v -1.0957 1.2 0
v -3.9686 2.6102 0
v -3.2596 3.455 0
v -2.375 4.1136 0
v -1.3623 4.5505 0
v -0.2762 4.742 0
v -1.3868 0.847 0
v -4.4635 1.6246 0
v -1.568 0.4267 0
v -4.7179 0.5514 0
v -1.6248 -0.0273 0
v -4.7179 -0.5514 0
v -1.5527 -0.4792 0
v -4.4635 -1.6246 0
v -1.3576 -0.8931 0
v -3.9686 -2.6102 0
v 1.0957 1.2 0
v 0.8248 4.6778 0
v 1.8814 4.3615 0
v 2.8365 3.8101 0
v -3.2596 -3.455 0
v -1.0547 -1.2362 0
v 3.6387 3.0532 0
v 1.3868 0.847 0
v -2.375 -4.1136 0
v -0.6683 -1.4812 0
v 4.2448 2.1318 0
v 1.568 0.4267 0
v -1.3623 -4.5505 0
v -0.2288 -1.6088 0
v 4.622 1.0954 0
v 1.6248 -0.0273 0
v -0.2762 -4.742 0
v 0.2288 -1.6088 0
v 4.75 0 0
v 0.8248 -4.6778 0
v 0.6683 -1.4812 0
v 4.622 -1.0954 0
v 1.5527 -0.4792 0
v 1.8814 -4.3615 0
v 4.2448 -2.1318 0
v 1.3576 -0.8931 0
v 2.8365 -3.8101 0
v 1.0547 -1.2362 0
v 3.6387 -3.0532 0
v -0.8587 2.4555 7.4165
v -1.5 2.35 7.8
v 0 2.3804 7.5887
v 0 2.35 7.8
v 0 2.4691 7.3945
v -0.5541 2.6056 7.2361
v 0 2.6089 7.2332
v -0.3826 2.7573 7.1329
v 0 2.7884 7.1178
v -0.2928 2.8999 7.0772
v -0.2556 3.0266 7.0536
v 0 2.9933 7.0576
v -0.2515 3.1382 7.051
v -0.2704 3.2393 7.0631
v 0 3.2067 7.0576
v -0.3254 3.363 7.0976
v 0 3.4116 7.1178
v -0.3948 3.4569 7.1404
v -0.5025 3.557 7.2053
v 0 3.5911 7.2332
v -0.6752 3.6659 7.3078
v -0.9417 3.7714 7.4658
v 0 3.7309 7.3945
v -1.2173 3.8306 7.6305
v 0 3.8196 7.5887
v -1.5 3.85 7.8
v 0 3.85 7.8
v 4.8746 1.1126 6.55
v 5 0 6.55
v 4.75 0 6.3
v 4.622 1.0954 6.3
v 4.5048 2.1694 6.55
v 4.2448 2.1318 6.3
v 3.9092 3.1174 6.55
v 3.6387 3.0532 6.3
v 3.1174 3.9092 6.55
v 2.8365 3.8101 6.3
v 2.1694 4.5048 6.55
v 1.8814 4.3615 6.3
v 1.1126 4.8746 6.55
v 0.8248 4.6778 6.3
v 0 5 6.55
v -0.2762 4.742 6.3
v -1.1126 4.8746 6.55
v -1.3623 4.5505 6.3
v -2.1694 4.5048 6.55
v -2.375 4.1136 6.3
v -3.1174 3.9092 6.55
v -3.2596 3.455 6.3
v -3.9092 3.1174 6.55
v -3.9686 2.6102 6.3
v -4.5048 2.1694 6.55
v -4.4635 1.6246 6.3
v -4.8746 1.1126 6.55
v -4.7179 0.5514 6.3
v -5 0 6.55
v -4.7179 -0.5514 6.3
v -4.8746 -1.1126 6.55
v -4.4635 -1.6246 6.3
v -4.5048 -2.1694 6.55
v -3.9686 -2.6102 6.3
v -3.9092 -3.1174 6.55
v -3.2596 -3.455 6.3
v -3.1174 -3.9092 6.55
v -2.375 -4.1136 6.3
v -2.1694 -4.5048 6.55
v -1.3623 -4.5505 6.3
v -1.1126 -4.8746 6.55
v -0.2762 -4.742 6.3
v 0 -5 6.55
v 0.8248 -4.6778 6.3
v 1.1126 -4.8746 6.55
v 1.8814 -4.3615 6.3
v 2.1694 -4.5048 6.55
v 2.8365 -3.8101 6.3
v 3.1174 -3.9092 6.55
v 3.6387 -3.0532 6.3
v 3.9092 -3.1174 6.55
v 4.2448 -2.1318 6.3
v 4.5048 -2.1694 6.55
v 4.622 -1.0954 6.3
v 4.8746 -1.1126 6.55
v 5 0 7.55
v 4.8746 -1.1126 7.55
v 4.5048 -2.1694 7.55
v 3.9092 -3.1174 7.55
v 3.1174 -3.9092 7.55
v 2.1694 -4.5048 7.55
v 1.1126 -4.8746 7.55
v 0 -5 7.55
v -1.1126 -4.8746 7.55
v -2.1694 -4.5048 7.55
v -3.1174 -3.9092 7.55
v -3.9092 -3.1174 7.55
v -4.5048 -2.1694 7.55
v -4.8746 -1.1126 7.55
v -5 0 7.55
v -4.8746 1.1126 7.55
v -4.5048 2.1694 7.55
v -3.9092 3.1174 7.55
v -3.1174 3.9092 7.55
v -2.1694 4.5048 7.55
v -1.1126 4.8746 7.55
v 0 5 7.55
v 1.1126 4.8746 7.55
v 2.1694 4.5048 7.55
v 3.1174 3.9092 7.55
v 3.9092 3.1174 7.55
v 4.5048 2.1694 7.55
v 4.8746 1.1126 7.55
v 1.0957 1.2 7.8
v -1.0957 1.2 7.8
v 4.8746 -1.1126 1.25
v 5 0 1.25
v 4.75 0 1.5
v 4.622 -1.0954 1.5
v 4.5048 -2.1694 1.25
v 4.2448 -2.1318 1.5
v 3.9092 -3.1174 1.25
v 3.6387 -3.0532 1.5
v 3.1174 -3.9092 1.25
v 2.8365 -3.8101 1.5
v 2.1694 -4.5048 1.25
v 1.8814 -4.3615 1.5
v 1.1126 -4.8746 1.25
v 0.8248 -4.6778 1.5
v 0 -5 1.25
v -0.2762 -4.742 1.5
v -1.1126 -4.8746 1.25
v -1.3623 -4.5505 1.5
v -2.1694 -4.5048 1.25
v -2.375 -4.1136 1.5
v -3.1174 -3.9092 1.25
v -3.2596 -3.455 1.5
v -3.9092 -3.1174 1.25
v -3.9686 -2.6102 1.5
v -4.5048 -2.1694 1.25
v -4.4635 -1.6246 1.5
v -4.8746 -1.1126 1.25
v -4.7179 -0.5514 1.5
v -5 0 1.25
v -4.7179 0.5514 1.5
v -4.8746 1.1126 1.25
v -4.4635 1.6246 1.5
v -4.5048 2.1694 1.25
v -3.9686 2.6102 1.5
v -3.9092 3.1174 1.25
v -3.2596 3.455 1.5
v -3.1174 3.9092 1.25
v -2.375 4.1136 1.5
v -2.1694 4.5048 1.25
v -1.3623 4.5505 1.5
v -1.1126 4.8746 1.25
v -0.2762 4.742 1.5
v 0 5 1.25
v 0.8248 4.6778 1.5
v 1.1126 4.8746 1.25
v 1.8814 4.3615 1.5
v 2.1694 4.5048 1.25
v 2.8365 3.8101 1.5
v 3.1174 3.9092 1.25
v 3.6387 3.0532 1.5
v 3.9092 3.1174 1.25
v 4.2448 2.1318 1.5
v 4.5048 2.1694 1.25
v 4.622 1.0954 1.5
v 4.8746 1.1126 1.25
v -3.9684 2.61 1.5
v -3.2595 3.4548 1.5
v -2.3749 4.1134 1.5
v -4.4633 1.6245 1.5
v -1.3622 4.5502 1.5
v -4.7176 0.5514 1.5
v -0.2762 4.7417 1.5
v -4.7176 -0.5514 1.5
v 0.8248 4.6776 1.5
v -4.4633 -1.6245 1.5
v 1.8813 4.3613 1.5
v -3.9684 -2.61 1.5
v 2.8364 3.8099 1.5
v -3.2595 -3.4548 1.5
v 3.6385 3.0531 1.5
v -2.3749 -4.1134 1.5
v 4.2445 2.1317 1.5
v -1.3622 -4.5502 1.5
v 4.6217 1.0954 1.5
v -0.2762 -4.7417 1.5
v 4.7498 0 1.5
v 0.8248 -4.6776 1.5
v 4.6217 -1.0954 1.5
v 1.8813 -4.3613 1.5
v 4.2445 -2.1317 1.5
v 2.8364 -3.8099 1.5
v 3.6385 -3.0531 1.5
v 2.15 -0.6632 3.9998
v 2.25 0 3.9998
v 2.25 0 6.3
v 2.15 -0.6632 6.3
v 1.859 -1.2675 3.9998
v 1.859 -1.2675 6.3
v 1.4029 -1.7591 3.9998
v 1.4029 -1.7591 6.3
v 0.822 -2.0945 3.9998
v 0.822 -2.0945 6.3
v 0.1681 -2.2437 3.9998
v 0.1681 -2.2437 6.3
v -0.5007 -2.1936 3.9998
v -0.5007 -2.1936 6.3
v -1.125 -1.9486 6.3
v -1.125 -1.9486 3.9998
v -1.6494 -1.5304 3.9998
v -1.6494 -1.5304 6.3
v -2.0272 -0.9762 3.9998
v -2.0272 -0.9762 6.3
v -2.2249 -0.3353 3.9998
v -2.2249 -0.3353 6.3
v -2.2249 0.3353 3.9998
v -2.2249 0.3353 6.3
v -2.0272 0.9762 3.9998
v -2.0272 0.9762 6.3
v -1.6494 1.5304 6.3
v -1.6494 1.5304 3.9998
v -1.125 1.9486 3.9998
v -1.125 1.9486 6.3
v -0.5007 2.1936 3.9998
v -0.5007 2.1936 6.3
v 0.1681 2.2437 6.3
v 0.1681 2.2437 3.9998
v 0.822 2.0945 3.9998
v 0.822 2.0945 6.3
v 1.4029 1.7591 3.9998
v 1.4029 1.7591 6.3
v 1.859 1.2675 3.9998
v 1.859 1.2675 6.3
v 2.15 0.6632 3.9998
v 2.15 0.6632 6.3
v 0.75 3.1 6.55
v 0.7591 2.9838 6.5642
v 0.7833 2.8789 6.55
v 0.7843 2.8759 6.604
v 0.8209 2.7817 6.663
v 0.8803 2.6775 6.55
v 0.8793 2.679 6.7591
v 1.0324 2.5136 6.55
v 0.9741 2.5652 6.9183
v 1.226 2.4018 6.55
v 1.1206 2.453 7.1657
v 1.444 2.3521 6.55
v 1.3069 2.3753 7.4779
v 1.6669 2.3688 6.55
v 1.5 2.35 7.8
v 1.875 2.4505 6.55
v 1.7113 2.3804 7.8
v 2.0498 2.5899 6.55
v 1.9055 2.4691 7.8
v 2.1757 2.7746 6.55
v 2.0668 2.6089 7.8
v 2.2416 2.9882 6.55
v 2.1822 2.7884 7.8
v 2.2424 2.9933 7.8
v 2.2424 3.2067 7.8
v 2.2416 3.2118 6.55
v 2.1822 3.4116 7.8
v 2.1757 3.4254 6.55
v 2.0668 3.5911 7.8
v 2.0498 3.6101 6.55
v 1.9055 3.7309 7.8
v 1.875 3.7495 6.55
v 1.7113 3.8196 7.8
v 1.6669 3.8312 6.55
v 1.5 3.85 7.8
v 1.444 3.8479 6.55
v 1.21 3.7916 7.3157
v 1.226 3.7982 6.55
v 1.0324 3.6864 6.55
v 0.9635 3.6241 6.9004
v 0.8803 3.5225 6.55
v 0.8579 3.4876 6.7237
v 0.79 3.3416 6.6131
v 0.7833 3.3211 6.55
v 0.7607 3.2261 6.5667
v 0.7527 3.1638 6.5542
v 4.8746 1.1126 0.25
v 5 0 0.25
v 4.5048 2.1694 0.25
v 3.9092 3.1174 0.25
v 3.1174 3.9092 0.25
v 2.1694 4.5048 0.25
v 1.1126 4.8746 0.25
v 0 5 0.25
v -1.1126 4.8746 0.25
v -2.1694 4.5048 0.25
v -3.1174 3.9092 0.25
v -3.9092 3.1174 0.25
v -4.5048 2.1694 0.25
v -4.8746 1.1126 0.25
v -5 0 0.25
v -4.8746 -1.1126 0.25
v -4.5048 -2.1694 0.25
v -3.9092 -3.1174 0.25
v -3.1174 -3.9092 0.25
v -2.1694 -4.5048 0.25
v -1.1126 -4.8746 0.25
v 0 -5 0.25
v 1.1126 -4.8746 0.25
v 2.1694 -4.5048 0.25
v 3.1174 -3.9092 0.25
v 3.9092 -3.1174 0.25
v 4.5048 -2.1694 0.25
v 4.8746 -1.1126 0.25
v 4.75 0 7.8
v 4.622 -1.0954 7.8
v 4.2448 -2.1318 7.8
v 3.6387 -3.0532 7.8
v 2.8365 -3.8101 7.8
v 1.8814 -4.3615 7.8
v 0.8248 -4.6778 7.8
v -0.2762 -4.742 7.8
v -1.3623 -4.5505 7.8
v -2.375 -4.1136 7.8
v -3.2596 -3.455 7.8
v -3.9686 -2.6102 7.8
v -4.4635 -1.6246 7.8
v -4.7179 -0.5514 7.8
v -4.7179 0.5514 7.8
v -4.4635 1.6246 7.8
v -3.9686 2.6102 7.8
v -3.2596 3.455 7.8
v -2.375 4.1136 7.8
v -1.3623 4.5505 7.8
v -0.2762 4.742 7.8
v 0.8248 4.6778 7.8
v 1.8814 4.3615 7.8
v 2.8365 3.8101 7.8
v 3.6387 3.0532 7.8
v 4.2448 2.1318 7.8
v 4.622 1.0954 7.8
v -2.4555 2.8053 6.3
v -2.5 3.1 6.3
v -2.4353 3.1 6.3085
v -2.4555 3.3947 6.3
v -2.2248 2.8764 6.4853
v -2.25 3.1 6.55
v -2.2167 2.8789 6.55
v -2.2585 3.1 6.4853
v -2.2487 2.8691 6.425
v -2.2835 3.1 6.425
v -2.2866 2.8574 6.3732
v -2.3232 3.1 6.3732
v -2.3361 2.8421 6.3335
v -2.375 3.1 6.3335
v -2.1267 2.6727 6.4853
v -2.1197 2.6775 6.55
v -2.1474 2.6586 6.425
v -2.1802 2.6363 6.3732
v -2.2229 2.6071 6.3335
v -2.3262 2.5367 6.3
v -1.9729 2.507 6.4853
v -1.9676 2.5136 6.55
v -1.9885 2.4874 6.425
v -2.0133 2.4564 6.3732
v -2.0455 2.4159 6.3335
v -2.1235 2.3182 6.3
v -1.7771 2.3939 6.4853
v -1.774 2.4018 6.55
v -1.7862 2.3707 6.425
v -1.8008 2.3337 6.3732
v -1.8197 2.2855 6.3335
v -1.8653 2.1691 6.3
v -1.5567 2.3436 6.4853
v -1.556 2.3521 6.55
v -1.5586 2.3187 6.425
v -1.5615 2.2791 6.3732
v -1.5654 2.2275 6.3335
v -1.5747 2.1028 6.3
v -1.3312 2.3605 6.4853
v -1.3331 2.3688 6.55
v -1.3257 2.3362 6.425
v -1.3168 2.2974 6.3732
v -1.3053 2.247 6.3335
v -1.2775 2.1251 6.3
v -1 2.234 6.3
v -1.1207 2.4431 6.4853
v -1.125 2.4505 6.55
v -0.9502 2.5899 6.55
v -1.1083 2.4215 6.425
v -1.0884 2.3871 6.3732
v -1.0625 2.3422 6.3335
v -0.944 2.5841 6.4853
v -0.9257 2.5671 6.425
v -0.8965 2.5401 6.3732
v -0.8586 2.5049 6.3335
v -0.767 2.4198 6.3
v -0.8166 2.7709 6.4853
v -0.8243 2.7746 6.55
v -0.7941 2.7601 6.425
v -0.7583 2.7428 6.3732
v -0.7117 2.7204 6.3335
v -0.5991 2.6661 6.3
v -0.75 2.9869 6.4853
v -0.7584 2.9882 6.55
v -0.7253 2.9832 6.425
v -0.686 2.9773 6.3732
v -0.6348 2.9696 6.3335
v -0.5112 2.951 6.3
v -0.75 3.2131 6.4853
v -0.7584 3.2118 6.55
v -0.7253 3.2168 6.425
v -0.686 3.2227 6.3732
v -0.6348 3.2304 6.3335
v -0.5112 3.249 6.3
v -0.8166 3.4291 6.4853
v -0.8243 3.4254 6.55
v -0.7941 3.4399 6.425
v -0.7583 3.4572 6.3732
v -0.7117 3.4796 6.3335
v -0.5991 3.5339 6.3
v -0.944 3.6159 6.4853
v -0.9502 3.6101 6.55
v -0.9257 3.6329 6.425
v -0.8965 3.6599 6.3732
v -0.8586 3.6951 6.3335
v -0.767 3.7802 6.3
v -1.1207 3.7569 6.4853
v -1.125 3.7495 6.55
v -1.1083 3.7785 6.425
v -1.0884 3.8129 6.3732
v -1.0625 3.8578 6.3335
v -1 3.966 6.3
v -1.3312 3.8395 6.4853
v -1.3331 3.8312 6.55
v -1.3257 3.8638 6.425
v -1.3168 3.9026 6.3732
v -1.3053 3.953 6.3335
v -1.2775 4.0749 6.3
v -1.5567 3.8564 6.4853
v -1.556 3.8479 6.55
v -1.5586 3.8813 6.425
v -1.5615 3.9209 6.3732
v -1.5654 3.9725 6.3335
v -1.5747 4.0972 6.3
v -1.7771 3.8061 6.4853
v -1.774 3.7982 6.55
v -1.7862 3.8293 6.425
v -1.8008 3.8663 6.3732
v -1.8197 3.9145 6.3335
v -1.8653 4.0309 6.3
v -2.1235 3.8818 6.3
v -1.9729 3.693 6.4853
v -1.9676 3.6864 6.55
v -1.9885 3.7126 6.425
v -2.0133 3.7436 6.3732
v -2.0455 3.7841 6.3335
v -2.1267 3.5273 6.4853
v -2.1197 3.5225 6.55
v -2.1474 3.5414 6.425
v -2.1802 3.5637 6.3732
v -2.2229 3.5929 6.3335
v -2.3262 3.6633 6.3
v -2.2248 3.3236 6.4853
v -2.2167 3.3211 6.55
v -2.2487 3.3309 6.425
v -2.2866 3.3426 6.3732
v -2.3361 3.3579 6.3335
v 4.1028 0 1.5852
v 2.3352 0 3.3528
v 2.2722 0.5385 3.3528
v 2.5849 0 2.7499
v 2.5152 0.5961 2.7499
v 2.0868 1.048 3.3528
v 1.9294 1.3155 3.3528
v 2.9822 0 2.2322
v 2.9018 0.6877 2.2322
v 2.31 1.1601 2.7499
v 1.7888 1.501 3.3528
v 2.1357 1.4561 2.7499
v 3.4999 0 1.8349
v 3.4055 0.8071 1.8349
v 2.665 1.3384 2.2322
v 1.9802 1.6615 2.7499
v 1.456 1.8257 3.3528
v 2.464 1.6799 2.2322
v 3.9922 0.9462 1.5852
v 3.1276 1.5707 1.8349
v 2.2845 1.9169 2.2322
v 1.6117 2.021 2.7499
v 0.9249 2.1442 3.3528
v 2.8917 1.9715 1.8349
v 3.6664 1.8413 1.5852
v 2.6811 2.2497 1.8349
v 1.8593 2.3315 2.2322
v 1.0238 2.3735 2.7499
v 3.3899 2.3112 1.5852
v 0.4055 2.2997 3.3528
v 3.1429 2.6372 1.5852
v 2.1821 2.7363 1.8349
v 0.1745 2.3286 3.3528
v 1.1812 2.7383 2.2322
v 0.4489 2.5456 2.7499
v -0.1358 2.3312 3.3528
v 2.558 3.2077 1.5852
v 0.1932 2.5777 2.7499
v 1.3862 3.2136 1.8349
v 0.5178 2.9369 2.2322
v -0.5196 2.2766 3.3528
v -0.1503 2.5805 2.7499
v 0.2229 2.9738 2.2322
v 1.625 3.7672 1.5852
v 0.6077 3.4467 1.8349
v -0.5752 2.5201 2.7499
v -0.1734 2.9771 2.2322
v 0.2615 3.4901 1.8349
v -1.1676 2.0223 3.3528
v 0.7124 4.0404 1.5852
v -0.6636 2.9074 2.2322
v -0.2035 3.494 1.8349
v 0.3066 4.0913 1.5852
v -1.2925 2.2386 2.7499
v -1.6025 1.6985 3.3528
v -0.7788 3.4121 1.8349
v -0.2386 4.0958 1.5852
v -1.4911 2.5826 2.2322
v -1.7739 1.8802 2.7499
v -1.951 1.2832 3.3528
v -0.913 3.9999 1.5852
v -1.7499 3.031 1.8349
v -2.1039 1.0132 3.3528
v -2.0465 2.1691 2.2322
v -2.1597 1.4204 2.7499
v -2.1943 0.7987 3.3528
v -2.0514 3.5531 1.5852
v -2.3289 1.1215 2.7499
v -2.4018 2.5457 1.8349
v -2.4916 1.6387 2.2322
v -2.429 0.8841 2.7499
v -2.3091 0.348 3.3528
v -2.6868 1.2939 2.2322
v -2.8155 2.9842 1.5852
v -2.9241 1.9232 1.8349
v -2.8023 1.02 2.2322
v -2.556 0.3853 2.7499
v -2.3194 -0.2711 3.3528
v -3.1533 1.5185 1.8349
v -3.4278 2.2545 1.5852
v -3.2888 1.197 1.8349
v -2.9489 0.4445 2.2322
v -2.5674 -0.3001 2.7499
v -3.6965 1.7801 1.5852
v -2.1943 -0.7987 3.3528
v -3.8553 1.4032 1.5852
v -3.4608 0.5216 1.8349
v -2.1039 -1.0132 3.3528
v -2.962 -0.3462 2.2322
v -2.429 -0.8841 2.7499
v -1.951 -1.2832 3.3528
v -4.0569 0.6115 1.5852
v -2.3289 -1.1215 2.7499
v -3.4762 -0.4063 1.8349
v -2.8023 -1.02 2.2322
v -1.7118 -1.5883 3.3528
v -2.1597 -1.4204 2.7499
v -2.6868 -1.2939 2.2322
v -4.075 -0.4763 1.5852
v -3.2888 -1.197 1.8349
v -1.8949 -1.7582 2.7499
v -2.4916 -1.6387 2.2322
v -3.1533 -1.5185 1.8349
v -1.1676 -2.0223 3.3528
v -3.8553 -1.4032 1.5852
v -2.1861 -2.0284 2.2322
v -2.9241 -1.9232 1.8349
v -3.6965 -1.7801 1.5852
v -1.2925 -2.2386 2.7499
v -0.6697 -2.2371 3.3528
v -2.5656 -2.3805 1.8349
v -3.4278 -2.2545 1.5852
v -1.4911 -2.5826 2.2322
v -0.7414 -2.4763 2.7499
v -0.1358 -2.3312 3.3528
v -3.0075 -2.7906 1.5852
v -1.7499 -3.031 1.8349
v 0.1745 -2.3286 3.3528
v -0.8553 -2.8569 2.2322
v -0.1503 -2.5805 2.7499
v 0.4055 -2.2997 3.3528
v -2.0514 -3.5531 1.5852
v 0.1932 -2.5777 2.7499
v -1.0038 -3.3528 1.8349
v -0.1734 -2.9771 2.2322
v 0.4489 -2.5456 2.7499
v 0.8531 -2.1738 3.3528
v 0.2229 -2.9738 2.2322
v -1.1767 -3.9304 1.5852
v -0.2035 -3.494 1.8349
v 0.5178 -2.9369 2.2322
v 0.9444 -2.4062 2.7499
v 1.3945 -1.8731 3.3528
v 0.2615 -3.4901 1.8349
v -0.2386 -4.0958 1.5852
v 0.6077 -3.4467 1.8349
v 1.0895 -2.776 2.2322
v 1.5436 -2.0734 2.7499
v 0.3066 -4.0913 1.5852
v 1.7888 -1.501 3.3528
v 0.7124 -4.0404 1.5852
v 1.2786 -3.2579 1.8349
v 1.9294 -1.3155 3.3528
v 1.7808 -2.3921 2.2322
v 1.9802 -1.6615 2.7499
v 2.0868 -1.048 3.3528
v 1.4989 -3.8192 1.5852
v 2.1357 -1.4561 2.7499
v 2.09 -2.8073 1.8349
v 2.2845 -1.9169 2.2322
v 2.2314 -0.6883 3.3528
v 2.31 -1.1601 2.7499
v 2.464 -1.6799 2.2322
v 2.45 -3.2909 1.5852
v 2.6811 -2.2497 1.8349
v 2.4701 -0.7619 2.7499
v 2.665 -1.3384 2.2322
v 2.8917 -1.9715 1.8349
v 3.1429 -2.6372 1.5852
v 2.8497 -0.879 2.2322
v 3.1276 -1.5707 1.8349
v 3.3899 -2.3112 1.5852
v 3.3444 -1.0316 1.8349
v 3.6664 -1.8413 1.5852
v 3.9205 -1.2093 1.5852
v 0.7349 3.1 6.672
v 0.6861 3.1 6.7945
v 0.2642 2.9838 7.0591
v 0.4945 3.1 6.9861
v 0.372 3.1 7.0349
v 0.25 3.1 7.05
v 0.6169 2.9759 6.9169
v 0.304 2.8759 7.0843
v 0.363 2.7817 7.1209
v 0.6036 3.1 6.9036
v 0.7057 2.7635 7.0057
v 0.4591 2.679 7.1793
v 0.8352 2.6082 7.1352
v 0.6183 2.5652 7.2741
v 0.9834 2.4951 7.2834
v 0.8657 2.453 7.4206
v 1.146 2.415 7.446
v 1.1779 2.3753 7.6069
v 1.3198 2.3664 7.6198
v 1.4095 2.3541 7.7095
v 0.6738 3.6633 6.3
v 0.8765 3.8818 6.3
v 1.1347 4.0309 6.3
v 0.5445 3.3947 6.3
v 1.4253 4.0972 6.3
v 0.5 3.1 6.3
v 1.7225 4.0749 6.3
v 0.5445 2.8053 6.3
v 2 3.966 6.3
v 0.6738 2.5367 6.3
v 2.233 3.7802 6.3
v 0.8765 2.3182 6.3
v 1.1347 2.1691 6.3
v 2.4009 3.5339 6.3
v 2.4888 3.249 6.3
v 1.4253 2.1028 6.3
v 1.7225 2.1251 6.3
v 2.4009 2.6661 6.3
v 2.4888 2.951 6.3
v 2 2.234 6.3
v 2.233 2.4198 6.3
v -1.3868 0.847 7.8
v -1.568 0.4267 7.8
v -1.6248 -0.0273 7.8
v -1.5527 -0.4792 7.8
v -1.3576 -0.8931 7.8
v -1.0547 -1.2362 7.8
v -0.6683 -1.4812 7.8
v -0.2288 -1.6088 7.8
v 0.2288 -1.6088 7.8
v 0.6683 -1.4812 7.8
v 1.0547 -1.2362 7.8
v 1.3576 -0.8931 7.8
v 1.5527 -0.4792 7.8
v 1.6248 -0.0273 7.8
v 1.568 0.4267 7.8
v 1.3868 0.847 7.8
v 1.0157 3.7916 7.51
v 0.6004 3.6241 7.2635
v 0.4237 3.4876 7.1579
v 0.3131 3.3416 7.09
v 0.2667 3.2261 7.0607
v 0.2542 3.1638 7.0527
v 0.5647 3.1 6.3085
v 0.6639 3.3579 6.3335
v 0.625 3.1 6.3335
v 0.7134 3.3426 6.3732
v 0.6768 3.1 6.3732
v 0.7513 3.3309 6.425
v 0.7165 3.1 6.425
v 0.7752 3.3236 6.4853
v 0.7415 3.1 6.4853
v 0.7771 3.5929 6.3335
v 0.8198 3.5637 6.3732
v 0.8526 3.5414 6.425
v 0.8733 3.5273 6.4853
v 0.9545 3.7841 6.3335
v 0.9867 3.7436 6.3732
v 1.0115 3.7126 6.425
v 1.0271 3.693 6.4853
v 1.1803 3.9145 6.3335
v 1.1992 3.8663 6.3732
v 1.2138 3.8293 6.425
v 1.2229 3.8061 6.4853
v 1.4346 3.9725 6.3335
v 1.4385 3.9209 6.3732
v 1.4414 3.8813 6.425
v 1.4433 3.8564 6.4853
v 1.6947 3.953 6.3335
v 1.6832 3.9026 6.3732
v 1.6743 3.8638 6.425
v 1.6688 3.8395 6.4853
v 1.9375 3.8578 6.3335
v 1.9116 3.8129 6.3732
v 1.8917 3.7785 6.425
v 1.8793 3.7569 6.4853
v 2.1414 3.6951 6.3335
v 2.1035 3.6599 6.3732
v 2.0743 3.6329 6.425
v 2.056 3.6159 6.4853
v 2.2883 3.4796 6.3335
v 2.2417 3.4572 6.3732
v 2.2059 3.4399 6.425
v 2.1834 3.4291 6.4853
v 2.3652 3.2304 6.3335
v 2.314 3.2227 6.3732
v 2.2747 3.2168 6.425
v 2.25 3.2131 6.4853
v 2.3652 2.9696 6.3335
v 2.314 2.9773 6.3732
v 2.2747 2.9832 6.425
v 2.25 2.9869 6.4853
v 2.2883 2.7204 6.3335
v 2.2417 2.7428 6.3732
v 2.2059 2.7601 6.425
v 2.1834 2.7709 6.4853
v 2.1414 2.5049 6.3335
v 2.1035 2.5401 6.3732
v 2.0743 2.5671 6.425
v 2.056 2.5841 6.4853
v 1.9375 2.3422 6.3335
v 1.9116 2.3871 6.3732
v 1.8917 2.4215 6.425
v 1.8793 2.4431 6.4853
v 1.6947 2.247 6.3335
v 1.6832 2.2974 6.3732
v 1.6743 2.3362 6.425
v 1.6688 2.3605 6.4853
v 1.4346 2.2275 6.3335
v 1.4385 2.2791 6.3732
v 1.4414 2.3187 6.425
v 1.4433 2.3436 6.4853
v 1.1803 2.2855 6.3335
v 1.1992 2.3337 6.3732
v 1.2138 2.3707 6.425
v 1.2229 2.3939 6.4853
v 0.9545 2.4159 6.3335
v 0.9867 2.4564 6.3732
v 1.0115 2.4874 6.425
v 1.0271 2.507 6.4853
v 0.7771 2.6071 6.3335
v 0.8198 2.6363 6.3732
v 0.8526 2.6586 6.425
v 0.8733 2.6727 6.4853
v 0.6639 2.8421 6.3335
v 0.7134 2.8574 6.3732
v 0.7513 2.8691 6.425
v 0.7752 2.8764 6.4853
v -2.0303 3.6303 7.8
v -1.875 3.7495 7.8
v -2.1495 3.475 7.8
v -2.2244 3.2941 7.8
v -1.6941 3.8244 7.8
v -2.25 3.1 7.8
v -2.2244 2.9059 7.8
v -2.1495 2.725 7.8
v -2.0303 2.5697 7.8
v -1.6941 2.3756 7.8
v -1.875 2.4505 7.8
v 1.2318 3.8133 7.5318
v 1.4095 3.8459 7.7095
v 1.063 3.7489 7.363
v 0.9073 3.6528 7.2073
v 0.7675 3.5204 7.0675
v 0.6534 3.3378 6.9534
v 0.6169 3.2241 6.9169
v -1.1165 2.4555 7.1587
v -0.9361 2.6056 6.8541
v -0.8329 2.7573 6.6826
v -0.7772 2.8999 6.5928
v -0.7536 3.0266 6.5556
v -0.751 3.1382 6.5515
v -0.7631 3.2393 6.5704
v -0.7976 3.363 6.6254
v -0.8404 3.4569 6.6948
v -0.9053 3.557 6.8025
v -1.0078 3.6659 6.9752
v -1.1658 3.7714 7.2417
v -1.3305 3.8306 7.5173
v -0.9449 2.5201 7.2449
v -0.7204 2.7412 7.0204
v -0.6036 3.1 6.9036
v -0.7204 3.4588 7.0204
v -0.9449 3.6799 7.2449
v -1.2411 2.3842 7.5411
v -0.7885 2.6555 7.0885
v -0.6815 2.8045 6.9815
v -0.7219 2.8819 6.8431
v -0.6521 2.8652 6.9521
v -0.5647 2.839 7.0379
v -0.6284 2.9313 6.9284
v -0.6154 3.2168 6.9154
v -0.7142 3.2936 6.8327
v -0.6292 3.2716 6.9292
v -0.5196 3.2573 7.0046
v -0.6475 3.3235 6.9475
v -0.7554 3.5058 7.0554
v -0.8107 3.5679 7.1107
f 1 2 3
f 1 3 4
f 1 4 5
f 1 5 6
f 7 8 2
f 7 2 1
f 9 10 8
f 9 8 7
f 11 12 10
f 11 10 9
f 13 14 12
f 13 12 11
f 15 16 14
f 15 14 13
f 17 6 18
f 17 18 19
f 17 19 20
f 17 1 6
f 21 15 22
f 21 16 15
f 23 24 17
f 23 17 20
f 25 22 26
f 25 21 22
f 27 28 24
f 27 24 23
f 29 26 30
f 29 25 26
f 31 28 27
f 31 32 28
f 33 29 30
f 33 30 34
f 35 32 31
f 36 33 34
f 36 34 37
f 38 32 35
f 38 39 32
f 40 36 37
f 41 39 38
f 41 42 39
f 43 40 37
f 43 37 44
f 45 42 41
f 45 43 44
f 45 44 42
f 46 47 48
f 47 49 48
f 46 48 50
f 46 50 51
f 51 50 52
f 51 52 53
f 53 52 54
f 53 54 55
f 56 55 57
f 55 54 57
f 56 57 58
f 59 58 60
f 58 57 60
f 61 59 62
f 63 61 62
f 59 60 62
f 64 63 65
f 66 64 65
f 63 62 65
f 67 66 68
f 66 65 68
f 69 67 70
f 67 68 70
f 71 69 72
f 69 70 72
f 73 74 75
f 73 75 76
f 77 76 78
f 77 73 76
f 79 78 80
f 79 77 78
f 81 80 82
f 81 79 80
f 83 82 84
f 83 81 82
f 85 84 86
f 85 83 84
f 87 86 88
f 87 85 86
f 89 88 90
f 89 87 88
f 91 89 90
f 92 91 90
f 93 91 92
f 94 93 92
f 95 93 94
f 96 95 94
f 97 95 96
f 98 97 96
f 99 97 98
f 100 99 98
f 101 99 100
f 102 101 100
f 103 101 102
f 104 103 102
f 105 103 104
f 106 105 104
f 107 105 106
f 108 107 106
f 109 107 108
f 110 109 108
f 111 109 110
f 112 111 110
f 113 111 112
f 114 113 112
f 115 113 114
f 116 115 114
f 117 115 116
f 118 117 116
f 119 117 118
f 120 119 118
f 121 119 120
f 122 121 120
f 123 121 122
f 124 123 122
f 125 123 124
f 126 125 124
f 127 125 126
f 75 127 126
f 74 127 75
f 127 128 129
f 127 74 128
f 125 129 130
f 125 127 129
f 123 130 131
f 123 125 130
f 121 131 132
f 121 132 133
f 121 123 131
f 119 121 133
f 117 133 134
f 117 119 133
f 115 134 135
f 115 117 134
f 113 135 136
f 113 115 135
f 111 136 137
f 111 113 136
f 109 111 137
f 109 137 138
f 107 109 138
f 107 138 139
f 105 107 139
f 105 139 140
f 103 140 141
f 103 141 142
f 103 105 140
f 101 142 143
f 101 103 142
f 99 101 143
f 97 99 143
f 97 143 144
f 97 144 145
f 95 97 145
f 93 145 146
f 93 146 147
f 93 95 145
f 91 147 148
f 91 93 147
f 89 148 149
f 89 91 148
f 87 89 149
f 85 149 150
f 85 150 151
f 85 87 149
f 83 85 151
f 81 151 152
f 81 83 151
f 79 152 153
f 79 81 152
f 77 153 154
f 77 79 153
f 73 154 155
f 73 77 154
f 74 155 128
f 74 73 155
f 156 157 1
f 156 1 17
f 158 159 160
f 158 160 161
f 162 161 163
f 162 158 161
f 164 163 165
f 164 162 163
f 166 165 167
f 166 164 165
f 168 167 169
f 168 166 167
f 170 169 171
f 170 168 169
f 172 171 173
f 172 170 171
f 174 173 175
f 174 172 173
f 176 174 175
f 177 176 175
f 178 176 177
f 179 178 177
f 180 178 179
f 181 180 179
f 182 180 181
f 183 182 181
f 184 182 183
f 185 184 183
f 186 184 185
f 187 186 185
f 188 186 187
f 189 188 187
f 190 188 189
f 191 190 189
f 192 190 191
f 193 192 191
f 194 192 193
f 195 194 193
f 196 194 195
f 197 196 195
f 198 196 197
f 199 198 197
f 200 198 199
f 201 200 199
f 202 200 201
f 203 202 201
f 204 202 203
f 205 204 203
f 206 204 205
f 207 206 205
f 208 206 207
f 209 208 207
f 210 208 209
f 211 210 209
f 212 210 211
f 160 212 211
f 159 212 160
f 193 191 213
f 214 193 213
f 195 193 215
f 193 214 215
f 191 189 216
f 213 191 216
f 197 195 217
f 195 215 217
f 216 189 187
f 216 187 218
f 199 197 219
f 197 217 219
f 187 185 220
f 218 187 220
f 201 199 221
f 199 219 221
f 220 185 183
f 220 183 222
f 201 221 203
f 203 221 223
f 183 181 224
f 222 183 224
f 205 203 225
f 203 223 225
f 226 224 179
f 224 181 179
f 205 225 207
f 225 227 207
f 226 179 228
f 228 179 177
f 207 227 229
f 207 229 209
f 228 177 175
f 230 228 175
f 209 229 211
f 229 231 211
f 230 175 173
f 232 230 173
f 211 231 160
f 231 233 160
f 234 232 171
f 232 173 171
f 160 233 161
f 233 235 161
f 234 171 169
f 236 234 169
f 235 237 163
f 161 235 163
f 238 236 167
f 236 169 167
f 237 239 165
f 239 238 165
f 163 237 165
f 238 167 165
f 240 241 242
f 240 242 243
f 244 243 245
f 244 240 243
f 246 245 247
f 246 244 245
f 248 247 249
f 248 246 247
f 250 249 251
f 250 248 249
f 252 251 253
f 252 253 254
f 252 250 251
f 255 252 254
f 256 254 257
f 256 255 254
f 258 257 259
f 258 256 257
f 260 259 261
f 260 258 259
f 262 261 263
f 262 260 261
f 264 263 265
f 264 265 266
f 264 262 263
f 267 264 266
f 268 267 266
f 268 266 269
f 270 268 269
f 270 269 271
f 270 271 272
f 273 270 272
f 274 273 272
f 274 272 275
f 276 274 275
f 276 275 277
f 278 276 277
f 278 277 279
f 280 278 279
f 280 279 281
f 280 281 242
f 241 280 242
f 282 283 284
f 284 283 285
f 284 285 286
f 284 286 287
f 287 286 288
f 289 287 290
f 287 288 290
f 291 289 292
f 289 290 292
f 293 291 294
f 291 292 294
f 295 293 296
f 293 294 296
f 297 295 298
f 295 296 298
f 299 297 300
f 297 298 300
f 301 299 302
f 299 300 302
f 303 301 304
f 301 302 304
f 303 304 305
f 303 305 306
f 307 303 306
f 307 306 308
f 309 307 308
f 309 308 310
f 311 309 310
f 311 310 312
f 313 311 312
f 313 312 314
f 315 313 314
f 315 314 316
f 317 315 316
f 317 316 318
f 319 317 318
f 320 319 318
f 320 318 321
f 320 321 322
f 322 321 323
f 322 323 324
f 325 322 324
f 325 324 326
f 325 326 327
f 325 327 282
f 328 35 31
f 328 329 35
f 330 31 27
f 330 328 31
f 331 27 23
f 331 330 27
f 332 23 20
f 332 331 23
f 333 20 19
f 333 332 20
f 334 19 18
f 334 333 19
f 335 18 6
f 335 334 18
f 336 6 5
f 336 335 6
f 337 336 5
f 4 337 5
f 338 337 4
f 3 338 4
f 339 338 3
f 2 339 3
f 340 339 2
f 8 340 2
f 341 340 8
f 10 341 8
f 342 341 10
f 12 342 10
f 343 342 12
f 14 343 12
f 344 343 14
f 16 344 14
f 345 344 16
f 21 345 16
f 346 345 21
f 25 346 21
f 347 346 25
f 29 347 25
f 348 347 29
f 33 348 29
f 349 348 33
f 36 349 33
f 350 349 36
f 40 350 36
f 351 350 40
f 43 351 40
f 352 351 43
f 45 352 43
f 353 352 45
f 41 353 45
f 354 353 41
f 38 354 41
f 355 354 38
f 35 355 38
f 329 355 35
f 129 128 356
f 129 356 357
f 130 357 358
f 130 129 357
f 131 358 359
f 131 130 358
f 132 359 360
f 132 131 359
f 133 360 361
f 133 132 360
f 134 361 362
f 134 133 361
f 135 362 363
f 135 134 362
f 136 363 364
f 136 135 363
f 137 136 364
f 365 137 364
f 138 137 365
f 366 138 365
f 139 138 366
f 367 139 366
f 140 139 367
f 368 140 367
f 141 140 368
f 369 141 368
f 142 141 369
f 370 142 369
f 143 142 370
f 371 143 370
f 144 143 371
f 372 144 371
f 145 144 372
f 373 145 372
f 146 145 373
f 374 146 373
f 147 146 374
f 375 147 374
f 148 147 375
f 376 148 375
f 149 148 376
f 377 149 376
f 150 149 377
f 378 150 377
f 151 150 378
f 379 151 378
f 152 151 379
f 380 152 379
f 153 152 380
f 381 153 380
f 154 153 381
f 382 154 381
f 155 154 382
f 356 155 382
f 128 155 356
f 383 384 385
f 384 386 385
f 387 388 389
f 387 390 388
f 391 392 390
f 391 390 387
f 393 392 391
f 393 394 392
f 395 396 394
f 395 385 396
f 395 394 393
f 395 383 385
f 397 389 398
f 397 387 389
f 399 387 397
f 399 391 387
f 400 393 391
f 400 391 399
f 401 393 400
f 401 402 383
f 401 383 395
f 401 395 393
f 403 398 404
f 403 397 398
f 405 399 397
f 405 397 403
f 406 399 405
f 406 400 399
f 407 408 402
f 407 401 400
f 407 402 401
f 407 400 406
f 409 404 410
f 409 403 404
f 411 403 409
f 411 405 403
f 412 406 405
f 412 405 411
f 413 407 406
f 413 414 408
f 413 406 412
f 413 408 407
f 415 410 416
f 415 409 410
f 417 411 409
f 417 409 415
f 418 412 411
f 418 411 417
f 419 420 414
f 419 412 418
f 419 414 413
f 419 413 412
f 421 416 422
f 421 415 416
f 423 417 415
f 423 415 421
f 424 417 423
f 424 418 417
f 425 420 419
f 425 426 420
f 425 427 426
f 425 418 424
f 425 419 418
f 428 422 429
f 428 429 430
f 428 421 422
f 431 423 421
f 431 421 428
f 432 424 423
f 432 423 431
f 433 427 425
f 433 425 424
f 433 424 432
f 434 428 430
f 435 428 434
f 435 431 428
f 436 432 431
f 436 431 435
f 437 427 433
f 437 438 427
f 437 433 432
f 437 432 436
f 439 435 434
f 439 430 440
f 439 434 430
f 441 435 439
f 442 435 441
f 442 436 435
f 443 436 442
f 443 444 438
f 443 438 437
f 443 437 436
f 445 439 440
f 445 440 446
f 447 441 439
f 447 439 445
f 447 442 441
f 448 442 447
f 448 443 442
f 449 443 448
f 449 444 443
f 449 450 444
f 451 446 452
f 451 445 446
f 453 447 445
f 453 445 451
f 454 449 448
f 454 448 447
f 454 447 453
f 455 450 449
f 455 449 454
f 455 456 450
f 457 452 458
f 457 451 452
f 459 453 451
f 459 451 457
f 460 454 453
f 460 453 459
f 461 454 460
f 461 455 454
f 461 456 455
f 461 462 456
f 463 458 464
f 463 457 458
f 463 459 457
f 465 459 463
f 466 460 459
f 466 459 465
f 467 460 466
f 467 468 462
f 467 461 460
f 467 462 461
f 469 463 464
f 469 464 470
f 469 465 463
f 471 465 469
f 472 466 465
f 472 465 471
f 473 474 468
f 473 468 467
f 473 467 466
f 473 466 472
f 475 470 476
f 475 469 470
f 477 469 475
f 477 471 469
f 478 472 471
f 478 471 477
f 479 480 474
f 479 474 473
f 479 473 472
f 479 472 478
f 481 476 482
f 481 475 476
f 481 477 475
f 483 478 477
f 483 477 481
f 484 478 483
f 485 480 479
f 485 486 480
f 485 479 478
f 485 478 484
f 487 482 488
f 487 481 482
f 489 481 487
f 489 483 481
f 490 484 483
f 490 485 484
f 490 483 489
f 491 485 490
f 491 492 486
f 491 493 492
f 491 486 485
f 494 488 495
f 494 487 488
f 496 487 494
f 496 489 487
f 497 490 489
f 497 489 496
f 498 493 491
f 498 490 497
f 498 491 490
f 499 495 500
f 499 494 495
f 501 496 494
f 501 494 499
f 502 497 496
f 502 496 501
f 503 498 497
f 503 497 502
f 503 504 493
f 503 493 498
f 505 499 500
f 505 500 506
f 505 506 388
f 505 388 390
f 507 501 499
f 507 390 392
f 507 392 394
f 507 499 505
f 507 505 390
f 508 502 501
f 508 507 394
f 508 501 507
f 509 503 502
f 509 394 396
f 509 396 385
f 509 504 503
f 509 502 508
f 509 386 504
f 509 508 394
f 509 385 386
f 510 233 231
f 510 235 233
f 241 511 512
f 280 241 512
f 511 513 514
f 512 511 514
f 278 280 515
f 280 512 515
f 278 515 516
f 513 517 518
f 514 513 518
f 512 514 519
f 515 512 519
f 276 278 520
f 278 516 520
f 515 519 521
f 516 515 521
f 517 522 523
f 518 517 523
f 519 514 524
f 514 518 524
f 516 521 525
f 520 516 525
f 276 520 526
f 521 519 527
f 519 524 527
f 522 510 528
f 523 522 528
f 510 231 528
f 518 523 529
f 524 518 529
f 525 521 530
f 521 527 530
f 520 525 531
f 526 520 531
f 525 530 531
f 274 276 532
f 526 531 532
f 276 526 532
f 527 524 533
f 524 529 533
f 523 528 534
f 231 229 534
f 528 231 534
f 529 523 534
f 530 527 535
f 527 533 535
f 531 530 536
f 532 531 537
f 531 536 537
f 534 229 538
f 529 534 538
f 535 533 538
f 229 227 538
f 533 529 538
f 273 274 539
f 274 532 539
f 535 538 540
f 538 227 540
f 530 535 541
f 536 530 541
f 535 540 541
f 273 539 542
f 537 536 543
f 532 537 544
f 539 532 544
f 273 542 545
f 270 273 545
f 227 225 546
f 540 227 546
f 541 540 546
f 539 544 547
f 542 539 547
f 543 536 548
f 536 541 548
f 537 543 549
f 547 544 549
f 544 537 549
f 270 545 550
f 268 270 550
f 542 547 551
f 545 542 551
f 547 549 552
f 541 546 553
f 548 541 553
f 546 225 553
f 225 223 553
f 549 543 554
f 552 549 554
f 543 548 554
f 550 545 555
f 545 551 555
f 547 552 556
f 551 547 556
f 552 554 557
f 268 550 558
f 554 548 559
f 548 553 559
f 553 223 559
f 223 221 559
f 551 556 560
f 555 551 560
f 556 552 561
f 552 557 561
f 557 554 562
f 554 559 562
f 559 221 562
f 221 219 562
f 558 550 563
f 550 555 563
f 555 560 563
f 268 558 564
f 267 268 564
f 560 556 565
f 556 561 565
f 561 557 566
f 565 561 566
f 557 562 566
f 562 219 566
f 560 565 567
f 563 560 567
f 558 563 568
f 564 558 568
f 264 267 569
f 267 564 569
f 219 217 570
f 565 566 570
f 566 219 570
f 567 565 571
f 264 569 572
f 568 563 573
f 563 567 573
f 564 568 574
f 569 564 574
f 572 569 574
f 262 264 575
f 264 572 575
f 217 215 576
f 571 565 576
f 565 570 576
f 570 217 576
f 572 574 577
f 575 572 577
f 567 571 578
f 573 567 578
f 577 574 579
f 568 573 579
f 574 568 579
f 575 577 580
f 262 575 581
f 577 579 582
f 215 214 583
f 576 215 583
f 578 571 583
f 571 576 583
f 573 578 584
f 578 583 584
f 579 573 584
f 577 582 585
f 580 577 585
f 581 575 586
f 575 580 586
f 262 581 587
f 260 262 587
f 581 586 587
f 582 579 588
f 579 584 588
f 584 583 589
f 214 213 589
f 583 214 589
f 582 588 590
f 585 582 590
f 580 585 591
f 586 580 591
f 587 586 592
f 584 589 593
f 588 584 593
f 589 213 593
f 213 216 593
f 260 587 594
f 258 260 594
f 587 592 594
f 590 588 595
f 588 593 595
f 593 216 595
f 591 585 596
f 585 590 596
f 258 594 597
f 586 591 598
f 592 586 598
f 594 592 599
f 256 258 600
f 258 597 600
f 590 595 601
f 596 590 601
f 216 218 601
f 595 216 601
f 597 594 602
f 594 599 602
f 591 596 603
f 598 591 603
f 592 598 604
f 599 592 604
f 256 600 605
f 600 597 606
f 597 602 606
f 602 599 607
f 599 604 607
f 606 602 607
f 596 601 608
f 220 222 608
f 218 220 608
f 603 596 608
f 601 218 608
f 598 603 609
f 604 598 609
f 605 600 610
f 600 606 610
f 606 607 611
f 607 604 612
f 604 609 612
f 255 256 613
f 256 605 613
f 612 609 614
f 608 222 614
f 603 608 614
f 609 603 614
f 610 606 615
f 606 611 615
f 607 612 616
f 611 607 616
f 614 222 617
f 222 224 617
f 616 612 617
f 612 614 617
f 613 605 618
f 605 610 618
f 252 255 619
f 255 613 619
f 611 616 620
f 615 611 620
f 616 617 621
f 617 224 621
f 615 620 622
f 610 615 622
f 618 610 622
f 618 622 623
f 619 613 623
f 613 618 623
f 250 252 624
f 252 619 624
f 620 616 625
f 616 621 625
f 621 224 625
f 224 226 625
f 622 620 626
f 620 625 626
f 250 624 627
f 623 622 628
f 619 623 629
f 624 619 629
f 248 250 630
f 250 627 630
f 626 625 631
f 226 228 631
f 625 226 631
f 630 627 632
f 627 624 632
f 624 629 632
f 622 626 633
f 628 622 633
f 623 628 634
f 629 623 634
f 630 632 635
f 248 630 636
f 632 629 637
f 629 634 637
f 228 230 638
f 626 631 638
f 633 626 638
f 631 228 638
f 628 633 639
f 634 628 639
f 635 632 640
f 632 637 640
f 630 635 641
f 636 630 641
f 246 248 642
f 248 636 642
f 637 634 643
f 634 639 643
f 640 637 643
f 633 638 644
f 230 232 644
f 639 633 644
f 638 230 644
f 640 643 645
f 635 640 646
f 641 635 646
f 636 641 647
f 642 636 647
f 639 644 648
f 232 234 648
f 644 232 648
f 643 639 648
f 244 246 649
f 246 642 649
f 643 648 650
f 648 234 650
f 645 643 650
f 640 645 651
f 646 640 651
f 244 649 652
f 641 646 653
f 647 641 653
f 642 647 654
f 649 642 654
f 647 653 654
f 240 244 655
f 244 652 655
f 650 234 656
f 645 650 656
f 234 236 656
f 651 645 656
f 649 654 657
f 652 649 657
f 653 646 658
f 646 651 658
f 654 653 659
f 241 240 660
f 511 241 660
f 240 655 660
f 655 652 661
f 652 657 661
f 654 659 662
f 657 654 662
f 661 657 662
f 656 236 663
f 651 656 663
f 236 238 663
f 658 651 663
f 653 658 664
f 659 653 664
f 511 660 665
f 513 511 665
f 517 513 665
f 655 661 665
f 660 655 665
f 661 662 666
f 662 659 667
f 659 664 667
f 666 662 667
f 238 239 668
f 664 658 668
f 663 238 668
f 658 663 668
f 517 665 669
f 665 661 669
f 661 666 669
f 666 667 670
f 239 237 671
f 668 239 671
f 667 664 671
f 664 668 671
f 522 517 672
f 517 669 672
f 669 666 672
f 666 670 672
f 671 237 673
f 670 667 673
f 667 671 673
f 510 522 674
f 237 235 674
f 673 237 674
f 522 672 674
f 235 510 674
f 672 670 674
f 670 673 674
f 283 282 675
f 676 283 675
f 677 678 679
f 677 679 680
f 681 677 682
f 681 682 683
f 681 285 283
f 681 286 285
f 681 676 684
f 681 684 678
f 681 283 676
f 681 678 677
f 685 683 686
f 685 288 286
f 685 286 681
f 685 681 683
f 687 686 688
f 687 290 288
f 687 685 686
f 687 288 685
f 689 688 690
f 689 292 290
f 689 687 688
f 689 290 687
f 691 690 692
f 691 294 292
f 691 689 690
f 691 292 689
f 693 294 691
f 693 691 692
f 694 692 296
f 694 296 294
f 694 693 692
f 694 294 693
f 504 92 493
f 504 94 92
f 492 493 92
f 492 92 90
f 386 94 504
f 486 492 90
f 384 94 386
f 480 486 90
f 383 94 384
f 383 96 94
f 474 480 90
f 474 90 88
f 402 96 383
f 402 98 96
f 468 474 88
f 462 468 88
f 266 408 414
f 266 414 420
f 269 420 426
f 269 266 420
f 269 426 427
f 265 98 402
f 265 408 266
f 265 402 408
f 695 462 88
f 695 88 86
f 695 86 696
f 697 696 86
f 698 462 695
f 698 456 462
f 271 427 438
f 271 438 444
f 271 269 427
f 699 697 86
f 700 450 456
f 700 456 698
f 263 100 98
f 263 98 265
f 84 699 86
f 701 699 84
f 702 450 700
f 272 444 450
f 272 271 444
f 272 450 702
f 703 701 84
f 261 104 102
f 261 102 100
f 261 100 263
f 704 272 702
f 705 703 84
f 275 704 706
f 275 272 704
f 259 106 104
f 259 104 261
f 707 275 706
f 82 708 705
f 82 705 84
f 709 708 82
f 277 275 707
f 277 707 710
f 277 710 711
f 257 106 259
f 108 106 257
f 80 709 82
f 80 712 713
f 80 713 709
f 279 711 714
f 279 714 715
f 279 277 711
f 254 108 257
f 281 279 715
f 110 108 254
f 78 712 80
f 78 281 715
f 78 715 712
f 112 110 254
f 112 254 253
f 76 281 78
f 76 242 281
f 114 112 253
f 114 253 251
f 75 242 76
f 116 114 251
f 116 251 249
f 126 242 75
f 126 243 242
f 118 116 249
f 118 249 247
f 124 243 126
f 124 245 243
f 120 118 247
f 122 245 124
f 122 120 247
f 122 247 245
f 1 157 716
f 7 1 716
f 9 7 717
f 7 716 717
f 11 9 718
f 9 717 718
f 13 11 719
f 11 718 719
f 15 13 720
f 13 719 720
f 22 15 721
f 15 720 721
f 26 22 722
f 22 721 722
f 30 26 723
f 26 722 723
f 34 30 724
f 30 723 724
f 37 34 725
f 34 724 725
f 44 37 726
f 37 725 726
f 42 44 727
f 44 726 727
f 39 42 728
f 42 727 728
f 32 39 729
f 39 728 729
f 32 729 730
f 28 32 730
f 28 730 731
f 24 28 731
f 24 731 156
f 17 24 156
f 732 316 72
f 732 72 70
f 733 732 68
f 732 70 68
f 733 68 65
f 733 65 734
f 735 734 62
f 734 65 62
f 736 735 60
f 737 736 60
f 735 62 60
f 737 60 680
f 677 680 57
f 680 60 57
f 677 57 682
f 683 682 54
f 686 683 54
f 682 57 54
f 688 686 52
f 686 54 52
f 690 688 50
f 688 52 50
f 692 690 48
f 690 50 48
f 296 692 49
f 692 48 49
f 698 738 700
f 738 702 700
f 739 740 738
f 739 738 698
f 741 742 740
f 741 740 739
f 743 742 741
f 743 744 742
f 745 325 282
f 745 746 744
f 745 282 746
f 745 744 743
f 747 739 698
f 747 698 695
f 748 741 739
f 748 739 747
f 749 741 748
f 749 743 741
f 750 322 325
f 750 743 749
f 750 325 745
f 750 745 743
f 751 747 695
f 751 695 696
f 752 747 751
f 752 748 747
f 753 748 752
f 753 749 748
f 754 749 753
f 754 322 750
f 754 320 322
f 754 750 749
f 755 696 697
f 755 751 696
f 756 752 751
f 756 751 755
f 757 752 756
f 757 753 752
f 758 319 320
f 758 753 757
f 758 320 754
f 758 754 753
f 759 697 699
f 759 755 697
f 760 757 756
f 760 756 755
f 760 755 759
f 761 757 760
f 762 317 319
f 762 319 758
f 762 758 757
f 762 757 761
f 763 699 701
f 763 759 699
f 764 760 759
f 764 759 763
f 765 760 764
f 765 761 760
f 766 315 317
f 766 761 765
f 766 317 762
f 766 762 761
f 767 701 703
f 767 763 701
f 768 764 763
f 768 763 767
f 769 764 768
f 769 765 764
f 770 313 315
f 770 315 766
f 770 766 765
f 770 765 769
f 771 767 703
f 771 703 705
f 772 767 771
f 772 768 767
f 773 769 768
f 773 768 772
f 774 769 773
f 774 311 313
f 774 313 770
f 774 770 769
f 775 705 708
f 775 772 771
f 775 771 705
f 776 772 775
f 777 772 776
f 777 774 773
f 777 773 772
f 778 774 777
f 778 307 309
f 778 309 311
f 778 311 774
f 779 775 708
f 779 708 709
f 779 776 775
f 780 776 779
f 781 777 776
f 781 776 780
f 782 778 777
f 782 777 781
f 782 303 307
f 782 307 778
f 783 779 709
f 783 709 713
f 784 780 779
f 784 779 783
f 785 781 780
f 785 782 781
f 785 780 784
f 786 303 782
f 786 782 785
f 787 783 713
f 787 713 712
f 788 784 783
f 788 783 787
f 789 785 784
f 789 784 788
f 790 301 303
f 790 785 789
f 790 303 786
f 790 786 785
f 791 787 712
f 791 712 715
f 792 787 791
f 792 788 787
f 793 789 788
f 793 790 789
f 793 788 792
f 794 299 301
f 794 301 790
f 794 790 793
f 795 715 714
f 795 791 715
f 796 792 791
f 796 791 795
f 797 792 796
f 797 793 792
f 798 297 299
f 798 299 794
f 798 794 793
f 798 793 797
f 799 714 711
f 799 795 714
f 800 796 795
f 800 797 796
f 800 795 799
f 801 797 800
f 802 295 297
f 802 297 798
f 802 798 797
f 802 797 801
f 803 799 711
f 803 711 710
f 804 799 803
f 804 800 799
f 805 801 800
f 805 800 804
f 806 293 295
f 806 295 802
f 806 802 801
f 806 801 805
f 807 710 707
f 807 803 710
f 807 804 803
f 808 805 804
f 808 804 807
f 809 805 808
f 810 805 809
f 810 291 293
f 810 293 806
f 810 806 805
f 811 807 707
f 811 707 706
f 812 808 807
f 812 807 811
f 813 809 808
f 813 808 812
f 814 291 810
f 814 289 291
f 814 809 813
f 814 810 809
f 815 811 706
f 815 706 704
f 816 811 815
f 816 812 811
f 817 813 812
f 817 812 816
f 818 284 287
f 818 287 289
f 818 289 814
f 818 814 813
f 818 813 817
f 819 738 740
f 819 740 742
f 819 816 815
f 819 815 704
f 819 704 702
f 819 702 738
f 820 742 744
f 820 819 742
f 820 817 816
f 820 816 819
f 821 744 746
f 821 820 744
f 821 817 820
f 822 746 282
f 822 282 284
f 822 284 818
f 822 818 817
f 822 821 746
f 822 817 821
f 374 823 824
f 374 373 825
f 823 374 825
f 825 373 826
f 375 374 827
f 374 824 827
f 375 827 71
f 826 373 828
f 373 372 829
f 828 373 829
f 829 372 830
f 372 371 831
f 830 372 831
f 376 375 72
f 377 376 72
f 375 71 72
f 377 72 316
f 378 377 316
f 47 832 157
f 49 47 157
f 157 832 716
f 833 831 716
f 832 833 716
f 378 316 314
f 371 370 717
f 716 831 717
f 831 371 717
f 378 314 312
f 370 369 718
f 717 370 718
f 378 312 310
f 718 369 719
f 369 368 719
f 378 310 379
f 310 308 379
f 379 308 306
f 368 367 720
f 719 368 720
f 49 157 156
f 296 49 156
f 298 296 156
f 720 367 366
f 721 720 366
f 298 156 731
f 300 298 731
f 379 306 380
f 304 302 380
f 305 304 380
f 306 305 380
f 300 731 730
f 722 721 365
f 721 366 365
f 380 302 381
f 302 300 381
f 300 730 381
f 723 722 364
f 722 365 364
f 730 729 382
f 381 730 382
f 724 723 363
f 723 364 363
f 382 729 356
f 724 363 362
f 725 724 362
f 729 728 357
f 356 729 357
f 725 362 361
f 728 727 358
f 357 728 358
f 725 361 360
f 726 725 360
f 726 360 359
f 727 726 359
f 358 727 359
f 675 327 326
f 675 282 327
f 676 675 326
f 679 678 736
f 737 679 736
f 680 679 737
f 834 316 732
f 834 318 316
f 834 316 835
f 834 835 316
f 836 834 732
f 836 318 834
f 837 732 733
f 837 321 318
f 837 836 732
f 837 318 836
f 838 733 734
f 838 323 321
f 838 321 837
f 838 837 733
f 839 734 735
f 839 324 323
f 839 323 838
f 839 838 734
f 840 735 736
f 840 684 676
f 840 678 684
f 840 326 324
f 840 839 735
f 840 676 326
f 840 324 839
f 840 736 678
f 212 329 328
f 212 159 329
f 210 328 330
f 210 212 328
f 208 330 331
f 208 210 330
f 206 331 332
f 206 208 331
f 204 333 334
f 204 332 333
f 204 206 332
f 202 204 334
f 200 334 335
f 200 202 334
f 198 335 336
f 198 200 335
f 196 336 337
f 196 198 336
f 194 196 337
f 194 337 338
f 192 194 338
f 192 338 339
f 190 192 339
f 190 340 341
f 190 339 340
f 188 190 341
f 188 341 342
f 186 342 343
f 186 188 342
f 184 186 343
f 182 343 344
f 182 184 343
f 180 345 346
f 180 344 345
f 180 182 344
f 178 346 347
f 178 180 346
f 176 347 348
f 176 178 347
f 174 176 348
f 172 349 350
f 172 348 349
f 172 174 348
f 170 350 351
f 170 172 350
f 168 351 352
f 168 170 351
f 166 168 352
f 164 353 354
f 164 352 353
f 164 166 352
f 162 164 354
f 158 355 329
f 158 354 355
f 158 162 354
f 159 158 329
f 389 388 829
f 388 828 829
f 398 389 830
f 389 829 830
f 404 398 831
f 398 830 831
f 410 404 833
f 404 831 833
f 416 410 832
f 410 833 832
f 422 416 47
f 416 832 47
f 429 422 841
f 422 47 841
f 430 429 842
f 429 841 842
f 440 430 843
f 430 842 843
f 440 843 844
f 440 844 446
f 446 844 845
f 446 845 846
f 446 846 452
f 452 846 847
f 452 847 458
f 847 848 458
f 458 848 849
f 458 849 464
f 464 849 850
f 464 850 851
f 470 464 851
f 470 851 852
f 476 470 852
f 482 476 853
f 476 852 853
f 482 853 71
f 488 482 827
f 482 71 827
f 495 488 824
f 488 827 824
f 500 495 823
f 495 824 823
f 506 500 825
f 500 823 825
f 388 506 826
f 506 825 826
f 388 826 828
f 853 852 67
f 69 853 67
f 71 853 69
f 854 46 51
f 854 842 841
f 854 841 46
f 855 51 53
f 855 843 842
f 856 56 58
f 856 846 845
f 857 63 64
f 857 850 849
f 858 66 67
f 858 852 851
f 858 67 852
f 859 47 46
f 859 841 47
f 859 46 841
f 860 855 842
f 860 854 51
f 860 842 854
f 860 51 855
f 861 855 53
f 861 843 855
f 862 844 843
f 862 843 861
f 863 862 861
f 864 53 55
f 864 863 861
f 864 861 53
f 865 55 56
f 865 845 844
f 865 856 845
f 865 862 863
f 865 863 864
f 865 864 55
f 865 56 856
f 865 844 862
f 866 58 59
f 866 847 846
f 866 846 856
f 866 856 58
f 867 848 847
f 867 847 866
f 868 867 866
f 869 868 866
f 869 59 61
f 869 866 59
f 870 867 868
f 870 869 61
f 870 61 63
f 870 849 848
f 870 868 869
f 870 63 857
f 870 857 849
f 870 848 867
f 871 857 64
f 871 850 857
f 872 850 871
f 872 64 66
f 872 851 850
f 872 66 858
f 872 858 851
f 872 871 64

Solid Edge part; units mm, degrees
sketch "Sketch1" plane through (0, 0, 0) normal (0, -1, 0) x (1, 0, 0)
  line L0 (5, 6.3) -> (2.25, 6.3)
  line L1 (2.25, 6.3) -> (2.25, 1.5)
  line L2 (5, 1.5) -> (2.25, 1.5)
  line L3 (5, 0) -> (5, 1.5)
  line L4 (0, 0) -> (5, 0)
  line L5 (0, 7.8) -> (0, 0)
  line L6 (5, 7.8) -> (0, 7.8)
  line L7 (5, 7.8) -> (5, 6.3)
revolve "RevolvedProtrusion1" add sketch "Sketch1" angle 360 about axis through (0, 0, 7.8) along (0, 0, -1)
sketch "Sketch2" plane through (0, 0, 7.8) normal (0, 0, 1) x (1, 0, 0)
  line L0 (-1.0957, 1.2) -> (1.0957, 1.2)
  arc A0 (1.0957, 1.2) -> (-1.0957, 1.2) centre (0, 0) cw
extrude "Cutout1" cut sketch "Sketch2" against normal through all
sketch "Sketch3" plane through (0, 0, 7.8) normal (0, 0, 1) x (-1, 0, 0)
  circle A0 centre (-1.5, -3.1) radius 0.75
  circle A1 centre (1.5, -3.1) radius 0.75
  dimension "D1" = 1.5
  dimension "D2" = 1.5
  dimension "D3" = 3
  dimension "D4" = 1.9
extrude "Cutout2" cut sketch "Sketch3" against normal up to surface (1.5 mm away)
chamfer "Chaflán_1" distance 0.25 angle 45 4 edges at (-5, 0, 0) (-5, 0, 1.5) (-5, 0, 6.3) (-5, 0, 7.8)
sketch "Sketch4" plane through (0, 0, 0) normal (1, 0, 0) x (0, 1, 0)
  circle A0 centre (3.1, 7.8) radius 0.75
extrude "VaciadoExtruido_3" cut sketch "Sketch4" along normal mid plane 3
fillet "Redondeo_2" radius 0.5 2 edges at (-0.75, 3.1, 7.05) (0.75, 3.1, 7.05)
fillet "Redondeo_3" radius 0.25 2 edges at (2.25, 3.1, 6.3) (-0.75, 3.1, 6.3)
fillet "Redondeo_4" radius 2.5 1 edges at (-2.25, 0, 1.5)
